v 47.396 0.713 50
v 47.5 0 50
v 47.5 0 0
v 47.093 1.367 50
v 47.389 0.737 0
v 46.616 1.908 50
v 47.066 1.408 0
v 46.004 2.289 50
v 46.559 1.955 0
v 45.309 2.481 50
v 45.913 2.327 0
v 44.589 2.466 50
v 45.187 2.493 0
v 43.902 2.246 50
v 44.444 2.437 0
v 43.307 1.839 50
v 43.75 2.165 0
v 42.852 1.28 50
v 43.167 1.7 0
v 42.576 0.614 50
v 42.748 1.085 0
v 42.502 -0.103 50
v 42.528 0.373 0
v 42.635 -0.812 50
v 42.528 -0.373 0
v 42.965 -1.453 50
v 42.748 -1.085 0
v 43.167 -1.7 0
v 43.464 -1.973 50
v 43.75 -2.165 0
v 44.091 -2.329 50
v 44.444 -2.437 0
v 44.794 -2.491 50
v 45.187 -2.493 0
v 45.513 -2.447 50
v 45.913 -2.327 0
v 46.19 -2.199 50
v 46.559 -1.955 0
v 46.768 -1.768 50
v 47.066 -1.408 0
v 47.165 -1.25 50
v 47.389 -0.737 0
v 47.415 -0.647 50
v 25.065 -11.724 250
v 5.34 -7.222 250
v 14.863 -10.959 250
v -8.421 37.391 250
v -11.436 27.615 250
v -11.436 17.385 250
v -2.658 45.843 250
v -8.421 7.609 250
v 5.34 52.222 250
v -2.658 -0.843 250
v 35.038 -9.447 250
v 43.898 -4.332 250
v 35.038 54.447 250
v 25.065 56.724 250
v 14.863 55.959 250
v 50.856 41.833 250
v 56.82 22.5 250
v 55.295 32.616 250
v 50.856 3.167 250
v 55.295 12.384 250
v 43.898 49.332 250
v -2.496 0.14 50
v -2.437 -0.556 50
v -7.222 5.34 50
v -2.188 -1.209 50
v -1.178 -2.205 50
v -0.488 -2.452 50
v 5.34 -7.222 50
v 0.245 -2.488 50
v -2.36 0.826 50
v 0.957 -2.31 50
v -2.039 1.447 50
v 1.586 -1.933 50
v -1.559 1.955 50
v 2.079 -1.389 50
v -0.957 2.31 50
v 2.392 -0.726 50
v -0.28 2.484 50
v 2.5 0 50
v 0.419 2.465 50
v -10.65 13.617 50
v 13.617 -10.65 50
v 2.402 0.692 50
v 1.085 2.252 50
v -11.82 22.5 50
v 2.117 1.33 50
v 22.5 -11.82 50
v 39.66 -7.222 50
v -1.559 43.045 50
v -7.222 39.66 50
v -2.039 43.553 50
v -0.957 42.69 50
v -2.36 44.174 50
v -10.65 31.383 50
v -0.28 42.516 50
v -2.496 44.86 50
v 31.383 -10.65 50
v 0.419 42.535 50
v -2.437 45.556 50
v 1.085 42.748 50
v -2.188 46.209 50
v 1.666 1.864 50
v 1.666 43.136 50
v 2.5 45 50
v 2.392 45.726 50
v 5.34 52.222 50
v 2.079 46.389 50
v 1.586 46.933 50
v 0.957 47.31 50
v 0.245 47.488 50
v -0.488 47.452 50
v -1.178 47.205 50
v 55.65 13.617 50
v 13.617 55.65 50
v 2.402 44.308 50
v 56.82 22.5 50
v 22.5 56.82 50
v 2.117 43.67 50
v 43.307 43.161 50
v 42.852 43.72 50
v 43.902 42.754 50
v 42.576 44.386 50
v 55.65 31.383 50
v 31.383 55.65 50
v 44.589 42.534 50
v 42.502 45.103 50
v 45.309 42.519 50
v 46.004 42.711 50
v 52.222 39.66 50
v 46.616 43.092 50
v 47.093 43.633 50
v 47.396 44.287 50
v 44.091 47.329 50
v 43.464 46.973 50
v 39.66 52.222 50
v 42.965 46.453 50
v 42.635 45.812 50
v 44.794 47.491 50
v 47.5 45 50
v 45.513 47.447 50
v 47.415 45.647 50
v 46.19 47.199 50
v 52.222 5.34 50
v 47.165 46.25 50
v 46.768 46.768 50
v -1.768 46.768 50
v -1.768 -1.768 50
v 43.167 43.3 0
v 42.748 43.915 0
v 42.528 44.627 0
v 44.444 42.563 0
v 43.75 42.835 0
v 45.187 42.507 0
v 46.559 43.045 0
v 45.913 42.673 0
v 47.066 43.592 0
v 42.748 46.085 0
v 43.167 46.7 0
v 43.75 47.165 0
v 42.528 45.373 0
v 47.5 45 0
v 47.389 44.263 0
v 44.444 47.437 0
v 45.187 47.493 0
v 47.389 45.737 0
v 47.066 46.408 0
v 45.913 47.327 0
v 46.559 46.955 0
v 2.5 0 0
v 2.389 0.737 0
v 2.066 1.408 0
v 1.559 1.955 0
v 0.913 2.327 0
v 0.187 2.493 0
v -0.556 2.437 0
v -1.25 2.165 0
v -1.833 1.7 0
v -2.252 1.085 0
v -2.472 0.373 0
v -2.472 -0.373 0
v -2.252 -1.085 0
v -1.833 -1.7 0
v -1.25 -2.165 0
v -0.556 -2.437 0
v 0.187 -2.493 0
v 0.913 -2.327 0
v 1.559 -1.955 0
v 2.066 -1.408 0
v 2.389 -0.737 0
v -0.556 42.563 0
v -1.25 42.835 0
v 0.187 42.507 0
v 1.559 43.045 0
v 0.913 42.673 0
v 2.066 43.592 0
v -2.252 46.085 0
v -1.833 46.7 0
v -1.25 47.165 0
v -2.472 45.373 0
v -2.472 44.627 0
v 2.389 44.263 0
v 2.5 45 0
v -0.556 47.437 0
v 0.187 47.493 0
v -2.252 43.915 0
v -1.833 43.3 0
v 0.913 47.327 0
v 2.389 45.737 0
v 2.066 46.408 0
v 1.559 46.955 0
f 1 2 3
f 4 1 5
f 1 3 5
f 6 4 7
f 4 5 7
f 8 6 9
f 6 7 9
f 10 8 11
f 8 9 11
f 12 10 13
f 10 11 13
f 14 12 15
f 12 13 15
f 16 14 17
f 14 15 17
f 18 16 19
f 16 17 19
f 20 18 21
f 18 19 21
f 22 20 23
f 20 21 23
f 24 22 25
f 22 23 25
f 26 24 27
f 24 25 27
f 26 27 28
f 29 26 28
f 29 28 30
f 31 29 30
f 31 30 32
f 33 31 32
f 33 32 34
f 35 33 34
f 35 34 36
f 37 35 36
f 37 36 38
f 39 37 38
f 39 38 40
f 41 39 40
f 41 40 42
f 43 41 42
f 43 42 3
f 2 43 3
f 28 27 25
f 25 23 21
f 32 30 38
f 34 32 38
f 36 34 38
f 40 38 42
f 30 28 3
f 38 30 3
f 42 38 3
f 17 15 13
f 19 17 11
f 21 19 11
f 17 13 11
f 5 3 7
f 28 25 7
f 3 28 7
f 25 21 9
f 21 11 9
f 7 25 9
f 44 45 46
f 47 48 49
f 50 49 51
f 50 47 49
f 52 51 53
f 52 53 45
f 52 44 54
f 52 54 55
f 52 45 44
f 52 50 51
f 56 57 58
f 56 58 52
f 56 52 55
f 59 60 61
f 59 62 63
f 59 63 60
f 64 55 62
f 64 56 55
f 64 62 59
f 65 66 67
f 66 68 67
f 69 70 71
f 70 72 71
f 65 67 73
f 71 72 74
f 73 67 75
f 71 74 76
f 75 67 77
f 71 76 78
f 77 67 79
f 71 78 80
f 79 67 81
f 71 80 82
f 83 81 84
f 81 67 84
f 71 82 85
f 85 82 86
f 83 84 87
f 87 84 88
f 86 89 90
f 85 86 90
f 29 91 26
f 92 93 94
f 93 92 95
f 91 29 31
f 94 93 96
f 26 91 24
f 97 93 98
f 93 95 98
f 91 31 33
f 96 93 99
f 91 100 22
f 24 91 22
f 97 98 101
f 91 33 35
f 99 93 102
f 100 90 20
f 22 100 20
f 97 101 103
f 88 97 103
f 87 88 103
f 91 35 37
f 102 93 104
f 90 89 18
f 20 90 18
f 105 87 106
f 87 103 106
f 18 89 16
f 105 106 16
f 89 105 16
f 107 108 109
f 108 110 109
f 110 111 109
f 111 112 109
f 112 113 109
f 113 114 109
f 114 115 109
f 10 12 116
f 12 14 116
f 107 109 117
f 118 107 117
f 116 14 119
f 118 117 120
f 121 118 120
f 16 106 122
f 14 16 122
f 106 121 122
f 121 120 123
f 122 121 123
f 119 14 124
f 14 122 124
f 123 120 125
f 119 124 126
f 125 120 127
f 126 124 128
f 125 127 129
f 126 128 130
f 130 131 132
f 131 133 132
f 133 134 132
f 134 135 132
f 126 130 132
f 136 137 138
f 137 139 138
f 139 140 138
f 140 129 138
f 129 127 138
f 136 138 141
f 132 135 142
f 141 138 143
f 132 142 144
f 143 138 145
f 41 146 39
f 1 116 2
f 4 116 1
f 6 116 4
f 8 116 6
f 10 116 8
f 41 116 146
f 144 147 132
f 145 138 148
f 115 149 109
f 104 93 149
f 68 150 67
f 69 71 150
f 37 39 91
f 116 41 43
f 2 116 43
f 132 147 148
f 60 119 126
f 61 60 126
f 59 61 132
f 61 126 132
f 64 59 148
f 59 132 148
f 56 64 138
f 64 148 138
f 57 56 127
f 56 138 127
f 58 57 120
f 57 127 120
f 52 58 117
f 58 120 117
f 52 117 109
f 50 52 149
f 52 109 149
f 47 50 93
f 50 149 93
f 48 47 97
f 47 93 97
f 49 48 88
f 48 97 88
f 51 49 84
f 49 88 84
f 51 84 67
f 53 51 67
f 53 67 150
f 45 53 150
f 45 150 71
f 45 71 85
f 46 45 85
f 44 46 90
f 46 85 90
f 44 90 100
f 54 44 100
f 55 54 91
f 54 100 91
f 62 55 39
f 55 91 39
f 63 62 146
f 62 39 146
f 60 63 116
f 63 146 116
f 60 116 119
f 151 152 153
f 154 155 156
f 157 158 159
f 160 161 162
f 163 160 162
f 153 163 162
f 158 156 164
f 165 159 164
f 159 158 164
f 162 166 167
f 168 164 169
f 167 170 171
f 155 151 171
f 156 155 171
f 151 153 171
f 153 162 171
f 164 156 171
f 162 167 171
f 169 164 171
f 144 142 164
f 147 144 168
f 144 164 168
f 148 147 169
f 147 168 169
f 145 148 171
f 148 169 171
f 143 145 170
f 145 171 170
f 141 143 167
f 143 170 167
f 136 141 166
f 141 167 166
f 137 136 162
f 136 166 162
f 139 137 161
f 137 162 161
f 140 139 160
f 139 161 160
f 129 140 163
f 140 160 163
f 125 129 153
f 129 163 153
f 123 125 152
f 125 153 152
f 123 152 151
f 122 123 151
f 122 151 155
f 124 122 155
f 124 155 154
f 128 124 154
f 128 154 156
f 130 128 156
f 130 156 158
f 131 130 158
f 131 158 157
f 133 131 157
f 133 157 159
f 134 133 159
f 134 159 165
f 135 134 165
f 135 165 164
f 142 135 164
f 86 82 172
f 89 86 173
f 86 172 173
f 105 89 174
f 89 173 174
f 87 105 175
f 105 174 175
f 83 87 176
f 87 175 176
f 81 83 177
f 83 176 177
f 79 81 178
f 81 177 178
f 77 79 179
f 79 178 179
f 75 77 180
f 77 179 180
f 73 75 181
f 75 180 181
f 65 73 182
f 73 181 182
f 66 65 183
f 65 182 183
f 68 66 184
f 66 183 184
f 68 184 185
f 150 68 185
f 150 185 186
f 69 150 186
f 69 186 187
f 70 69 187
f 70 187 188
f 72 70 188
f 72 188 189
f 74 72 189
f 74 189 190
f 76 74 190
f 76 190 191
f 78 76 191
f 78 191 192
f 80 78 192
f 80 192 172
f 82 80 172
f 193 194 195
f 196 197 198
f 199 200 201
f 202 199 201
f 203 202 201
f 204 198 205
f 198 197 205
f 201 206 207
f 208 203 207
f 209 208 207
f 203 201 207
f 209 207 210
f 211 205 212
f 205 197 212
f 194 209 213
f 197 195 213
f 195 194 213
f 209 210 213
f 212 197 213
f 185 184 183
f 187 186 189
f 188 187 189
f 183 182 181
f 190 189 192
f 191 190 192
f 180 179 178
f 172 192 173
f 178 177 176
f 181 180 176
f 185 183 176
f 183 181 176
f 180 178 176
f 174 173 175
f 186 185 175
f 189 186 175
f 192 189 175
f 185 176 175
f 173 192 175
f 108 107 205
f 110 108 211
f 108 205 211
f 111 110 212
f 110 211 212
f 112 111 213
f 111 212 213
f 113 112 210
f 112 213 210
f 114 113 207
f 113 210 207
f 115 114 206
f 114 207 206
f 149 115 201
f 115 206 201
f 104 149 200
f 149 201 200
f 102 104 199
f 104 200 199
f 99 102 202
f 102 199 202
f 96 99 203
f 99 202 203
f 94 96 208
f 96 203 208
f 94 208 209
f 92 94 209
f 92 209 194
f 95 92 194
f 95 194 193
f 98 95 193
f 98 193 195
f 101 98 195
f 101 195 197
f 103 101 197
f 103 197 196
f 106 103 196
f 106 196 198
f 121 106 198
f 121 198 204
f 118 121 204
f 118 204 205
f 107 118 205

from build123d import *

# Parameters (mm, degrees)
F0_R     = 2.5
F1_DEPTH = 50
F2_R     = 34.3198051534
F3_DEPTH = 200


# Not quite as in the source:
# - a feature of the source that left no trace in its solid (it failed there, or was rolled back) is left out


with BuildPart() as f1:
    # F0 (on Top) → F1 (new body)
    with BuildSketch(Plane.XY):
        with Locations((0, 45)):
            Circle(F0_R)
    extrude(amount=F1_DEPTH)



with BuildPart() as f1b:
    # F0 (on Top) → F1, piece 2 (new body)
    with BuildSketch(Plane.XY):
        with Locations((45, 45)):
            Circle(F0_R)
    extrude(amount=F1_DEPTH)


with BuildPart() as f1c:
    # F0 (on Top) → F1, piece 3 (new body)
    with BuildSketch(Plane.XY):
        Circle(F0_R)
    extrude(amount=F1_DEPTH)


with BuildPart() as f1d:
    # F0 (on Top) → F1, piece 4 (new body)
    with BuildSketch(Plane.XY):
        with Locations((45, 0)):
            Circle(F0_R)
    extrude(amount=F1_DEPTH)


with BuildPart() as f1_1:
    add(f1.part)

    add(f1b.part)  # F3 merges F1b

    add(f1c.part)  # F3 merges F1c

    add(f1d.part)  # F3 merges F1d
    # F2 (on face) → F3 (join)
    with BuildSketch(Plane.XY.offset(50)):
        with Locations((22.5, 22.5)):
            Circle(F2_R)
    extrude(amount=F3_DEPTH)


solid = f1_1.part
